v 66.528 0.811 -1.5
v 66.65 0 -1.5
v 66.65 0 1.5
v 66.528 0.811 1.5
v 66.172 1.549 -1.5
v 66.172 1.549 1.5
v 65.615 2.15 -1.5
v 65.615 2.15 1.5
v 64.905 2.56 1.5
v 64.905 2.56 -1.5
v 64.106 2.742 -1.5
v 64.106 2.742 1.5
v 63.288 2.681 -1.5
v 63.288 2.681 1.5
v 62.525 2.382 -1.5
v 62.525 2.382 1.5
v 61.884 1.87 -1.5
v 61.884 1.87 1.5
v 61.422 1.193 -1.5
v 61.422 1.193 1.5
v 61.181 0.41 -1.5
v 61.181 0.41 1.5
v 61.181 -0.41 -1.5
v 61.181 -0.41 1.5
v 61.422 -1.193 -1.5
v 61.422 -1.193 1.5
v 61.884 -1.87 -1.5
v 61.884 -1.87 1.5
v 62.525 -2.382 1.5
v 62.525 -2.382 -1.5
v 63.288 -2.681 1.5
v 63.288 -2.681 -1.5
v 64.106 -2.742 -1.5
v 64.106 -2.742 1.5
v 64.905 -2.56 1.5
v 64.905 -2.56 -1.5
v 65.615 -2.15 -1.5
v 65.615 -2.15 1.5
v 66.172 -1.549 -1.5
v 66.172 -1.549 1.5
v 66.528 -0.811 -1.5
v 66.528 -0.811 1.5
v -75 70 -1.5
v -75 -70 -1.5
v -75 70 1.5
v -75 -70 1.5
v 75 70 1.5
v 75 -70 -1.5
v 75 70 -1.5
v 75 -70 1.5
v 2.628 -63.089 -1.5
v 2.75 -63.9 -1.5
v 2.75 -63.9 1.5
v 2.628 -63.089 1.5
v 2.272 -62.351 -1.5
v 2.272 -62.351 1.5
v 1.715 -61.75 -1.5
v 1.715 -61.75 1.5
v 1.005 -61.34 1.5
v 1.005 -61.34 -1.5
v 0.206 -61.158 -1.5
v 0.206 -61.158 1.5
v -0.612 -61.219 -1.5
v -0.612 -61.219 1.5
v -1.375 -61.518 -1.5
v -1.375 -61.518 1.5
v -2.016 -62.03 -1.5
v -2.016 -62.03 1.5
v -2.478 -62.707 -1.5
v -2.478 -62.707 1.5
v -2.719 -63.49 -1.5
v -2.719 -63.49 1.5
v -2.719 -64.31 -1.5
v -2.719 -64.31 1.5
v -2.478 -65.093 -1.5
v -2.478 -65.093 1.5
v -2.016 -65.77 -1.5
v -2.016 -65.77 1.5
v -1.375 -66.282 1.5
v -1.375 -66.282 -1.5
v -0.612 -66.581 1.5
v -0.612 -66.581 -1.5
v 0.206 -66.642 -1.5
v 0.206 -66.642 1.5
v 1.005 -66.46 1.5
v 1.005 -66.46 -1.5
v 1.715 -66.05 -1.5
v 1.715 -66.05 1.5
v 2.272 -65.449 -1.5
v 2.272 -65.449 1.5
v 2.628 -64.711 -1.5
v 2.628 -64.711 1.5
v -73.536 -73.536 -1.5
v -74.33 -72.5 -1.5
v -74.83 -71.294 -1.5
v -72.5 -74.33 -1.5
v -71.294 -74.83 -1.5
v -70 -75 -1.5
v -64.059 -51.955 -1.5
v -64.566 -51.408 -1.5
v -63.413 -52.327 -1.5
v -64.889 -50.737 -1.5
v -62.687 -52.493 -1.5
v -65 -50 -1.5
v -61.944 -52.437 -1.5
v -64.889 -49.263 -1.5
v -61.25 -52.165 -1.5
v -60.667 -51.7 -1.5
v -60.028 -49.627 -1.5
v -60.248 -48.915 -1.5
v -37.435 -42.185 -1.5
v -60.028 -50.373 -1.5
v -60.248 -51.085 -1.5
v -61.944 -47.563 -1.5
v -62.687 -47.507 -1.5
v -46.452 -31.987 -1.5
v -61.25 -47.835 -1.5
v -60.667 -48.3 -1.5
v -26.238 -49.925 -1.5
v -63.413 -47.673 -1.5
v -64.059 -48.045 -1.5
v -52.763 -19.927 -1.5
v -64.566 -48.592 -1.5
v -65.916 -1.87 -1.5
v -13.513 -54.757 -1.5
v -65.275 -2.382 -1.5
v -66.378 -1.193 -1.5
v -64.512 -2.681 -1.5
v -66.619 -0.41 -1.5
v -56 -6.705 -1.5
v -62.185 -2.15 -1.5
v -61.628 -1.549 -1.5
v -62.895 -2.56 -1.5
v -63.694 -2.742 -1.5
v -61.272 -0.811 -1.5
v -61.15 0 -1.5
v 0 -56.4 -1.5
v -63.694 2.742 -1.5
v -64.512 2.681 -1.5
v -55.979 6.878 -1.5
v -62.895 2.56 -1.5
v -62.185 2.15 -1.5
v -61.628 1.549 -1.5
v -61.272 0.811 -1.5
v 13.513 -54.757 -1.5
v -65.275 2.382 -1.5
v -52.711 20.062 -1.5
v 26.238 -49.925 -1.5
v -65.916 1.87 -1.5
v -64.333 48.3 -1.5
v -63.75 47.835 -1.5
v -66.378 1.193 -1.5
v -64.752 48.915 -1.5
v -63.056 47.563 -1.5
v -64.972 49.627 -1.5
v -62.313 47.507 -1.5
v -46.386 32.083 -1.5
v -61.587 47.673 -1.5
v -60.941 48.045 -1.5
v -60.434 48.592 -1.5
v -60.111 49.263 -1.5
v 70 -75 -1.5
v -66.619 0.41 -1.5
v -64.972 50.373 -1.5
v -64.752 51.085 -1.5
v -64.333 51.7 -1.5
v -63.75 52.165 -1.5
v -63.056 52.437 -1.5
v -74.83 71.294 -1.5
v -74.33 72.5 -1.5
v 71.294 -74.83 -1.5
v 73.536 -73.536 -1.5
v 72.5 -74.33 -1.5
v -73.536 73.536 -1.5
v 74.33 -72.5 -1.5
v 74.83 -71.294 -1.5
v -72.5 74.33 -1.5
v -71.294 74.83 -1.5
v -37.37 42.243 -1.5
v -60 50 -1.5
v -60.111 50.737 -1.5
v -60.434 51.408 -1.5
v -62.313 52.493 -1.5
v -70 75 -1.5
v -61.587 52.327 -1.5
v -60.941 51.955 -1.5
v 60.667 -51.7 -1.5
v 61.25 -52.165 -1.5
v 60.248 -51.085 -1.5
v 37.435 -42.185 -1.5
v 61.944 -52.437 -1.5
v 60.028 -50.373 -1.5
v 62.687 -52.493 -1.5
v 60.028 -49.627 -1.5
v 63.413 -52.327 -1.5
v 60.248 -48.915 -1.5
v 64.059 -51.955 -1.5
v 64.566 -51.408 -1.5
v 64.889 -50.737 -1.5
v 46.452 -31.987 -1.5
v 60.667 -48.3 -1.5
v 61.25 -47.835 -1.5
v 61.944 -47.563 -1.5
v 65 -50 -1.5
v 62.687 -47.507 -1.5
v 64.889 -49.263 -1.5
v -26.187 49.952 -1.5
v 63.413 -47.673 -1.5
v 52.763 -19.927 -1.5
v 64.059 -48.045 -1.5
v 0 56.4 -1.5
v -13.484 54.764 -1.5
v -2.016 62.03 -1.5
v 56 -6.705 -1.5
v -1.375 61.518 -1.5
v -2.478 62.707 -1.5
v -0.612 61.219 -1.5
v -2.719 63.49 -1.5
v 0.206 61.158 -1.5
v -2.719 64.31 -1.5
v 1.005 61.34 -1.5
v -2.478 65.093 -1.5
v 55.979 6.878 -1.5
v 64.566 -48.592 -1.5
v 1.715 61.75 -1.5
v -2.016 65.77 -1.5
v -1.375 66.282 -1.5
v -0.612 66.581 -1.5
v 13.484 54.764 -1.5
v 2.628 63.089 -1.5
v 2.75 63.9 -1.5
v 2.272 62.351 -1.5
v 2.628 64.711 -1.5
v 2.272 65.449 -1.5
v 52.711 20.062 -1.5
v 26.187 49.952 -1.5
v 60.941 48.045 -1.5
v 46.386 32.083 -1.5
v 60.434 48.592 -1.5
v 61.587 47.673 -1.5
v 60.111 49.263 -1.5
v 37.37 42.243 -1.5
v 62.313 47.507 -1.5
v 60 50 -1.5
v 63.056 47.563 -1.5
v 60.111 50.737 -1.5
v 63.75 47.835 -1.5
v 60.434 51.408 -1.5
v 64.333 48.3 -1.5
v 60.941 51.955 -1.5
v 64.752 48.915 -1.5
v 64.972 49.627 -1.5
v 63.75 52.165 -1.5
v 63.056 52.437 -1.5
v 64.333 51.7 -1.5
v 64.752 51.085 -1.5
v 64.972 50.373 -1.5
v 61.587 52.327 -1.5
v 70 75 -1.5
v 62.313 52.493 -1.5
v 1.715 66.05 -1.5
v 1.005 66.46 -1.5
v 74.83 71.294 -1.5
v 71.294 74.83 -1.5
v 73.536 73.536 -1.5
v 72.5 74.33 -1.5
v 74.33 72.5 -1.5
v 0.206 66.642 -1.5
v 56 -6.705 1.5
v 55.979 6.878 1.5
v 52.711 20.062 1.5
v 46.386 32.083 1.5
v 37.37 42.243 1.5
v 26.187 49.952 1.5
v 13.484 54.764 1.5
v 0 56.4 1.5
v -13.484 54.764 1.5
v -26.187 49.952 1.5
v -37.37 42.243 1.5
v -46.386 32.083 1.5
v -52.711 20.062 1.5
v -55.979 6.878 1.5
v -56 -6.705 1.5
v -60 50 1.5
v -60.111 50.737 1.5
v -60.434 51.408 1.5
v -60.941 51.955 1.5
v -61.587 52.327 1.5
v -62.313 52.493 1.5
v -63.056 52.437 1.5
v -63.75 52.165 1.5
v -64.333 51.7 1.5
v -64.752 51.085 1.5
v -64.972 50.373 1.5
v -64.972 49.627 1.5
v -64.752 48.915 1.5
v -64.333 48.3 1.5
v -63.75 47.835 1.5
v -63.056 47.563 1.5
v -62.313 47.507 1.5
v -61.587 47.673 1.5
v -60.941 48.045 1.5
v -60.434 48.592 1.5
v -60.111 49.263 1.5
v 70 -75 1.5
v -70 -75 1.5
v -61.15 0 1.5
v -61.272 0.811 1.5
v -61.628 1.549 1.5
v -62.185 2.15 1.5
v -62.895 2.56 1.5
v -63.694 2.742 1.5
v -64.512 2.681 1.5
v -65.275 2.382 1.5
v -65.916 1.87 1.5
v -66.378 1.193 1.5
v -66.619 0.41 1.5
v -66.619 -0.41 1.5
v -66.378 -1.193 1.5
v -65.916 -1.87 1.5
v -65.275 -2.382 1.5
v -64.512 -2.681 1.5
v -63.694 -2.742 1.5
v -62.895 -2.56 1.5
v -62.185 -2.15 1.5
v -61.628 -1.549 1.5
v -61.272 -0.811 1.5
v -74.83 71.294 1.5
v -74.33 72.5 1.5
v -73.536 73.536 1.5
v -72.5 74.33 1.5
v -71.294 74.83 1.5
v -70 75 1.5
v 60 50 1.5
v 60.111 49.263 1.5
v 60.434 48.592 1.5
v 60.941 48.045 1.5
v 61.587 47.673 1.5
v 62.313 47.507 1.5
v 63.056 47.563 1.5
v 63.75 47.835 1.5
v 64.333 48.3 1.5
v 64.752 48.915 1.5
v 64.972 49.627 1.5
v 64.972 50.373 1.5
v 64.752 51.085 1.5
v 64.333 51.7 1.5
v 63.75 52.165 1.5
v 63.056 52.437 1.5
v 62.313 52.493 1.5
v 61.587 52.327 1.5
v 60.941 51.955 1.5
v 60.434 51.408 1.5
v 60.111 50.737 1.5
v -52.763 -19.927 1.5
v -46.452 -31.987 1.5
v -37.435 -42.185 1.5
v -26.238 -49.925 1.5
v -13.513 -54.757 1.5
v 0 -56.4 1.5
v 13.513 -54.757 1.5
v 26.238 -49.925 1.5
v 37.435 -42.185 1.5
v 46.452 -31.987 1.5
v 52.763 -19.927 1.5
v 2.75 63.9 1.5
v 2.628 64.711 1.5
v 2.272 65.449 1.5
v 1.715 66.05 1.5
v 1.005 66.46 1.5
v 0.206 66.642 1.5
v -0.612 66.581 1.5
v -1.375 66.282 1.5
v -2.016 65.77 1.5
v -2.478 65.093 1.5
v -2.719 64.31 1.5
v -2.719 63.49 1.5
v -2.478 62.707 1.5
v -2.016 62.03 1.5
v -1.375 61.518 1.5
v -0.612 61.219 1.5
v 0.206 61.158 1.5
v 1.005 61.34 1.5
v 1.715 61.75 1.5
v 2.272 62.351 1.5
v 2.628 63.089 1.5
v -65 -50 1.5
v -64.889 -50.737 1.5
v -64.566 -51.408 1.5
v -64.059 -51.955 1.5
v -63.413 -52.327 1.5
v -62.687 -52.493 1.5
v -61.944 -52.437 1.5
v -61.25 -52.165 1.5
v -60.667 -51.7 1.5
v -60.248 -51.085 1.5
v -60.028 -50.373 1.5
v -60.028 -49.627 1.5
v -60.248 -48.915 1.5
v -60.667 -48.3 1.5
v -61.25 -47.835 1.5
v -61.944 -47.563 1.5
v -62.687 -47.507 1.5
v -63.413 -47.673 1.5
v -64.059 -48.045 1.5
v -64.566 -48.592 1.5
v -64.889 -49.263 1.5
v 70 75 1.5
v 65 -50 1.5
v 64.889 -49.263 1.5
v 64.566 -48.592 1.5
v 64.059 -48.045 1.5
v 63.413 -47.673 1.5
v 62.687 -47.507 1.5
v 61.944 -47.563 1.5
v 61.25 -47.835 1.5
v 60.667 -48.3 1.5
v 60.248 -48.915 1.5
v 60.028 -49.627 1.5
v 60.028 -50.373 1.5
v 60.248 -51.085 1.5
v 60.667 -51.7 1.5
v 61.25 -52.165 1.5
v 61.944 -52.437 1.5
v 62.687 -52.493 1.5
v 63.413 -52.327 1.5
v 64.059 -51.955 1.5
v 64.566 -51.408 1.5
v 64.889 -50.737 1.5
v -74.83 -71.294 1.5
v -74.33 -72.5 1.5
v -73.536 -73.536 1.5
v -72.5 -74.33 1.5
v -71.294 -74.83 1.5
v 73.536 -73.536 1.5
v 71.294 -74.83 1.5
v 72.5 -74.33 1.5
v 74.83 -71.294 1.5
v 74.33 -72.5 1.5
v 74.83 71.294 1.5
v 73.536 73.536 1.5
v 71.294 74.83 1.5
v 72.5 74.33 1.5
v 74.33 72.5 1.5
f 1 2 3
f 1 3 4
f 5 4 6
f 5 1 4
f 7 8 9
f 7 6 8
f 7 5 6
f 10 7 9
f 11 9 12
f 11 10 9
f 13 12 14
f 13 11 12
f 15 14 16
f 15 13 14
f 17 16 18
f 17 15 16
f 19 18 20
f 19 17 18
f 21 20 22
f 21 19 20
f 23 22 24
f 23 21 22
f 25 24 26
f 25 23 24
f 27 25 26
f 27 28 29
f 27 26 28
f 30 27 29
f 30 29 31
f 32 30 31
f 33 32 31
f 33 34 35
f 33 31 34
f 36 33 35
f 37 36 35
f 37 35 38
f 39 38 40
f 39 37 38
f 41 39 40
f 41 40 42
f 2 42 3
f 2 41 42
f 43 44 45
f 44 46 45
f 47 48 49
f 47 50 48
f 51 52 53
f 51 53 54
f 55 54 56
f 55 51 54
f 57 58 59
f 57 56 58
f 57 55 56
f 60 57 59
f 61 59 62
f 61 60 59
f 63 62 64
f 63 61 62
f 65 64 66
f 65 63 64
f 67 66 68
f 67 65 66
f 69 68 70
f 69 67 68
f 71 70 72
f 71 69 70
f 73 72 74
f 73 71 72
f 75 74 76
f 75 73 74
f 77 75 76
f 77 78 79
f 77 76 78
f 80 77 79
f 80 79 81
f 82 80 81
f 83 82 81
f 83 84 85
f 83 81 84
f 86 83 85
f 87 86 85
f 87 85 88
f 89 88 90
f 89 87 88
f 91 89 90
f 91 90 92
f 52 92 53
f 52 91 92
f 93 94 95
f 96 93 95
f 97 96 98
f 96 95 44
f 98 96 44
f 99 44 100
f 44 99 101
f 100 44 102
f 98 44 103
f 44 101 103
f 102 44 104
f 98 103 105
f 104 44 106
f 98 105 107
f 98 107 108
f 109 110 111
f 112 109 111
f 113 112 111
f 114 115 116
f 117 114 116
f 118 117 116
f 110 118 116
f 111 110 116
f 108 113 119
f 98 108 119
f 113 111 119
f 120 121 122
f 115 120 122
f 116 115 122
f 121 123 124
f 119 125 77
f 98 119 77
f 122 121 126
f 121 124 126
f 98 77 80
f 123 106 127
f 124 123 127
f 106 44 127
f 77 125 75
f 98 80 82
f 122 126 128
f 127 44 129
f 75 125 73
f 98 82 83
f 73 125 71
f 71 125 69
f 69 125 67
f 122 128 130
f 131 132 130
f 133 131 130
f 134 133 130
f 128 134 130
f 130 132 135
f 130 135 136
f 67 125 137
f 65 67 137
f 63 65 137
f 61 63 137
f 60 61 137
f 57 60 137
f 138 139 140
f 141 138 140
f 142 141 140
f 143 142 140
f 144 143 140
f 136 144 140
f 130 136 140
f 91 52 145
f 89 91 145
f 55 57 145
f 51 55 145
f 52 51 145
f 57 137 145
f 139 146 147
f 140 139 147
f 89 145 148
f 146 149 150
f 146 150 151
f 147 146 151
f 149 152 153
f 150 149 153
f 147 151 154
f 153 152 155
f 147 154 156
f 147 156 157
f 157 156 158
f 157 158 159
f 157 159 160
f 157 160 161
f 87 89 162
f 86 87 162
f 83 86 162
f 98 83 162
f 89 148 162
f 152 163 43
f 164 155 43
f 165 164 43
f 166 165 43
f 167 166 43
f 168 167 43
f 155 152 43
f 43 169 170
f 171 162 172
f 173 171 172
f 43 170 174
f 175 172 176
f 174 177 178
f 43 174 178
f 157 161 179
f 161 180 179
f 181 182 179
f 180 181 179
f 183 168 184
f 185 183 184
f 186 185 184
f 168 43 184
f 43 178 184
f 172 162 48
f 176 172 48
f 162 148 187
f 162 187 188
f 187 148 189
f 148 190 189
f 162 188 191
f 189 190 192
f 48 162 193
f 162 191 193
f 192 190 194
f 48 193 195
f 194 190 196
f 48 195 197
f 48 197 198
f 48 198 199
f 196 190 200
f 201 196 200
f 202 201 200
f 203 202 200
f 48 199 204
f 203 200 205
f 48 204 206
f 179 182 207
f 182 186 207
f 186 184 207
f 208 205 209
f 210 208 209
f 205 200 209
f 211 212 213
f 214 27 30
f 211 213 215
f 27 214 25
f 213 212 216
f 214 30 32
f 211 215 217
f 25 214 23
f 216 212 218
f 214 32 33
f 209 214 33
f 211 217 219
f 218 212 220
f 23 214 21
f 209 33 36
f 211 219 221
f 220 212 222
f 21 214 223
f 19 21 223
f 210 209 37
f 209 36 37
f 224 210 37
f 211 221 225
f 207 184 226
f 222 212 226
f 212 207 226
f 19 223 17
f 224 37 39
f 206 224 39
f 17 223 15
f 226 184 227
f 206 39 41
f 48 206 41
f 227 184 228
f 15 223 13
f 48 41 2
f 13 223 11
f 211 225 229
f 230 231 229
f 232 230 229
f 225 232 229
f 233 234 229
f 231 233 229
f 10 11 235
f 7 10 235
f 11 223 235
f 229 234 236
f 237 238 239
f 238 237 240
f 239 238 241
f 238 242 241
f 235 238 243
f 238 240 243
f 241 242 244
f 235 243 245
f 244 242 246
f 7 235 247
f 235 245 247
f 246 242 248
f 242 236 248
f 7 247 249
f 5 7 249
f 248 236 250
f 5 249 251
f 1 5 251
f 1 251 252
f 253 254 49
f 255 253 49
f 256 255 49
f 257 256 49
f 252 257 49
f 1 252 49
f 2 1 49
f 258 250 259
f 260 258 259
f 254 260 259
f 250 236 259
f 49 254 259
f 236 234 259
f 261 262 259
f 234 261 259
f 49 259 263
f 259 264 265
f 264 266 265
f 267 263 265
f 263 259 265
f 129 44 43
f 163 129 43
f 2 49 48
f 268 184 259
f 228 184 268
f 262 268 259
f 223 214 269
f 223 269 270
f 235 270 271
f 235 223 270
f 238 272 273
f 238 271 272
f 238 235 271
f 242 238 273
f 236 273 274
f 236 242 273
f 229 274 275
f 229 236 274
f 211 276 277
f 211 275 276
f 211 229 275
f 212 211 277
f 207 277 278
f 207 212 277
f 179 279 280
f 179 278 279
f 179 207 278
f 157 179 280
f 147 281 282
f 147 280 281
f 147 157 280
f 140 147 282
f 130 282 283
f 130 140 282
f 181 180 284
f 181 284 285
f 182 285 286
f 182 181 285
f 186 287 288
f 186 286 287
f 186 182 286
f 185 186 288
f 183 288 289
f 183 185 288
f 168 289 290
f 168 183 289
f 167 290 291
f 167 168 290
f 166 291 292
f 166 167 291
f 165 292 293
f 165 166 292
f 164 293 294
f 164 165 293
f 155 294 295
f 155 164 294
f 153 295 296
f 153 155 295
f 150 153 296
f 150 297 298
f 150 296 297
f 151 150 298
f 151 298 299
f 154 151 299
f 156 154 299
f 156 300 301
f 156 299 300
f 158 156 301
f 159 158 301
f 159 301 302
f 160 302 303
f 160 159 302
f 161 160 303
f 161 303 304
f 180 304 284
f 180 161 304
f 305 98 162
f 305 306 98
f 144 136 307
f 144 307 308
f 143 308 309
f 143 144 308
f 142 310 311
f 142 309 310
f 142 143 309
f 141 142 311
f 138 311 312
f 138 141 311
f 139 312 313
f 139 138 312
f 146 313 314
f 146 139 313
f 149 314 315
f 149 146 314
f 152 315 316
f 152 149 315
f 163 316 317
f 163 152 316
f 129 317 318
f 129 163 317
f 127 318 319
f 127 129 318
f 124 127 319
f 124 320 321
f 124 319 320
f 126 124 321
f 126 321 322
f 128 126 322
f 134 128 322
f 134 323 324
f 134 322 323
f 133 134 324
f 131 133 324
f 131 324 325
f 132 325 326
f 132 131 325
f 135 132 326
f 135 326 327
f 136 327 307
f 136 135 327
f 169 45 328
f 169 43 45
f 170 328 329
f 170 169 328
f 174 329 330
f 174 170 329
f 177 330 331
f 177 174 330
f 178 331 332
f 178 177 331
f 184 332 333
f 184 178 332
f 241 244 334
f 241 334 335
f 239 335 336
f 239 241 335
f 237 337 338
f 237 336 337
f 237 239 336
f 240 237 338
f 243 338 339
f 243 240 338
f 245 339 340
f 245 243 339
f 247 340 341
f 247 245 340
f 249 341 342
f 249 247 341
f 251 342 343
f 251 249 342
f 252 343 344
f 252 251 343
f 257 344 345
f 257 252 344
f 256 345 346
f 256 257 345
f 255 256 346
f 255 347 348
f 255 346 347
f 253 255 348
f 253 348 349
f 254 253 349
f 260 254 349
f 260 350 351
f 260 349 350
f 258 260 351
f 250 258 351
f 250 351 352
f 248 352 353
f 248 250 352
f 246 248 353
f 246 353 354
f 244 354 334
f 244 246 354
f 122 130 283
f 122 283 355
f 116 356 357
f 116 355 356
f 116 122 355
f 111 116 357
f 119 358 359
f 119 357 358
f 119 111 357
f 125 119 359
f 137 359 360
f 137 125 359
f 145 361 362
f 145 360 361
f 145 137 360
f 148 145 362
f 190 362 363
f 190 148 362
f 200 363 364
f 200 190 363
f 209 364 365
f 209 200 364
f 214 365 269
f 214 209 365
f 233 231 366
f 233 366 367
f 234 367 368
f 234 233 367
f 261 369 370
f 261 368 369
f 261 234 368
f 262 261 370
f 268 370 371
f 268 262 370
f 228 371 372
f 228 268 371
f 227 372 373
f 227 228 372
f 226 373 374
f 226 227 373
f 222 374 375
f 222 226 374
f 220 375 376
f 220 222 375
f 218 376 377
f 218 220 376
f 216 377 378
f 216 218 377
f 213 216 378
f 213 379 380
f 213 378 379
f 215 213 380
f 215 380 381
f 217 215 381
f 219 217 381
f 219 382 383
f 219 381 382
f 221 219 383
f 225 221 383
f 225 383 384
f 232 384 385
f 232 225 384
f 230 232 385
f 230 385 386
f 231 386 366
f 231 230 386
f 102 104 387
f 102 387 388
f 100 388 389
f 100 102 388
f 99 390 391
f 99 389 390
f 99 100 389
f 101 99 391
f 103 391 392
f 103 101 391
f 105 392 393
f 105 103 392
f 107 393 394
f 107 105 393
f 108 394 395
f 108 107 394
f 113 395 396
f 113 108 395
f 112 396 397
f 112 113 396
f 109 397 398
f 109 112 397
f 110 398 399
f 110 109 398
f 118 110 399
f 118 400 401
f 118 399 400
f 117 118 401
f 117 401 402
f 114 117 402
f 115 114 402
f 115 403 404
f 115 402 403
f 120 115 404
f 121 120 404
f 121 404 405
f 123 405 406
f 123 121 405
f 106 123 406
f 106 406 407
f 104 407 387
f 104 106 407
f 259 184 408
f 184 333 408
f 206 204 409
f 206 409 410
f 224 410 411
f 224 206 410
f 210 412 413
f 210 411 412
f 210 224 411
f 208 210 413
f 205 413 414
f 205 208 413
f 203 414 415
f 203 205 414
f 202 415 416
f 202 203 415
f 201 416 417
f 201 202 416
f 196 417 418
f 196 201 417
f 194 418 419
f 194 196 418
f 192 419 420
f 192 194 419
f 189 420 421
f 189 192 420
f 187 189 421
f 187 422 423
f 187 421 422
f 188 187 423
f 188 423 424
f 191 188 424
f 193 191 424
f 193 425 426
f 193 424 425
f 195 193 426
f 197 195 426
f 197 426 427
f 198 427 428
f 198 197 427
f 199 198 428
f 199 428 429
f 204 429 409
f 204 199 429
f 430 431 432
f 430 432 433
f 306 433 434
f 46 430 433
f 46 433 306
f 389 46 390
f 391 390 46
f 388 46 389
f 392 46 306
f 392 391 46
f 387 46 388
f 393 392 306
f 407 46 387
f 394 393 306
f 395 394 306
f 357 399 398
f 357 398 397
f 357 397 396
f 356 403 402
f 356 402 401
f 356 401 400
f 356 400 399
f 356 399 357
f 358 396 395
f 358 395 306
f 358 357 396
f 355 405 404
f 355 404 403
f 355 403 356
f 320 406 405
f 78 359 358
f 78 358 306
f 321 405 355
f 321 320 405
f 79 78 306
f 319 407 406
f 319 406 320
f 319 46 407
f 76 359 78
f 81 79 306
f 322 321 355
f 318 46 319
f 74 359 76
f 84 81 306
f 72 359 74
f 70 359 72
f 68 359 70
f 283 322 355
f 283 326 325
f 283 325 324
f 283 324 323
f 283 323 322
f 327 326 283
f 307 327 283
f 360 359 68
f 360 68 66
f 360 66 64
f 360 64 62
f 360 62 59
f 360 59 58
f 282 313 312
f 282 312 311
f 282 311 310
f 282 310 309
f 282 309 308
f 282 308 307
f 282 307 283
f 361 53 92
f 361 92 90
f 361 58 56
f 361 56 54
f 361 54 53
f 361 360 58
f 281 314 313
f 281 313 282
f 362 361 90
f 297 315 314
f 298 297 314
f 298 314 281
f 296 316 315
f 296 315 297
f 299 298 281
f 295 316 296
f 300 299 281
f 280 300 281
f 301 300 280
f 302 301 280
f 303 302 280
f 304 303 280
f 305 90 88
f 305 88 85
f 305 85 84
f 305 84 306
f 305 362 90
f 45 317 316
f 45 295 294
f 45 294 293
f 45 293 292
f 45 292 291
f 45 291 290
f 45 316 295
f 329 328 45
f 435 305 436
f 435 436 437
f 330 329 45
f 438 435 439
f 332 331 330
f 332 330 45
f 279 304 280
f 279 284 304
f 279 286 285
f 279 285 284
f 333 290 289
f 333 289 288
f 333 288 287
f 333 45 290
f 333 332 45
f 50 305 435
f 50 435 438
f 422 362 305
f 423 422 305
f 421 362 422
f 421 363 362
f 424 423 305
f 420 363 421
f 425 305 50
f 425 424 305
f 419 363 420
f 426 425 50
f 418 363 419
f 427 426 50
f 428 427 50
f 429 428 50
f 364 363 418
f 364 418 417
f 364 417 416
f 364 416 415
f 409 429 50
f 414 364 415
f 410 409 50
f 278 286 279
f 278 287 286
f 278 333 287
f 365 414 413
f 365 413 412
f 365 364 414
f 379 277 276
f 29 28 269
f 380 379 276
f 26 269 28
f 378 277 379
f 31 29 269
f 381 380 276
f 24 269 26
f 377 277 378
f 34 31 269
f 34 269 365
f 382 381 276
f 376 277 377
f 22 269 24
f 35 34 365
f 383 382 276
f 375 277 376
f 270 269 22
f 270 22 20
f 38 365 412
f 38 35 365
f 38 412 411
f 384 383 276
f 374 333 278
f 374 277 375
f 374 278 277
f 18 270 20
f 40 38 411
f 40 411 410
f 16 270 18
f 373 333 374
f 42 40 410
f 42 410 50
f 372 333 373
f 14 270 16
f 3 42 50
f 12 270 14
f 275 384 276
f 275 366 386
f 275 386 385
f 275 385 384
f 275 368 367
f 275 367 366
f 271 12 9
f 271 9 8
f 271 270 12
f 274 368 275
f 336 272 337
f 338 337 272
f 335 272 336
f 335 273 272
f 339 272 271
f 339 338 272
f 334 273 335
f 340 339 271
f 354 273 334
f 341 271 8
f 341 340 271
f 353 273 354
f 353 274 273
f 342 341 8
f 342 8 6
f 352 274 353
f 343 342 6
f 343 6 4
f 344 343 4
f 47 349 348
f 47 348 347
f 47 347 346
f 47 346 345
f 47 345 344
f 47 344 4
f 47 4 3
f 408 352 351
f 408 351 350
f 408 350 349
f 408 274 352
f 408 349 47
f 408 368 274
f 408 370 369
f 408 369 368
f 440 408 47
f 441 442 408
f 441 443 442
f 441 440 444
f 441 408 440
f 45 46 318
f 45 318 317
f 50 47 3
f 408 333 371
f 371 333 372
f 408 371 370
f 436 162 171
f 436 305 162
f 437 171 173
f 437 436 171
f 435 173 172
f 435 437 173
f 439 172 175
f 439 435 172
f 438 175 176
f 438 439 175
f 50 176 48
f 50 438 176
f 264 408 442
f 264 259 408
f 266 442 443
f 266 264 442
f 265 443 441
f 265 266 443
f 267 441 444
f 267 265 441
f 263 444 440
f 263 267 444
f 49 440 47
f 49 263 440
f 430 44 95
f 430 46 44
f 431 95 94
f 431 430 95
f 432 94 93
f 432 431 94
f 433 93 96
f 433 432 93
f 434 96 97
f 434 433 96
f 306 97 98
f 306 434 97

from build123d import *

# Parameters (mm, degrees)
SKETCH1_W               = 150
SKETCH1_H               = 150
BOSS_EXTRUDE1_DEPTH     = 1.5
CUT_EXTRUDE1_DEPTH      = 107.076623249
CUT_EXTRUDE1_DEPTH_BACK = 107.076623249
SKETCH2_R               = 2.75
CUT_EXTRUDE2_DEPTH      = 107.076623249
CUT_EXTRUDE2_DEPTH_BACK = 107.076623249
CUT_EXTRUDE3_DEPTH      = 107.076623249
CUT_EXTRUDE3_DEPTH_BACK = 107.076623249
SKETCH4_R               = 2.5
FILLET1_R               = 5


with BuildPart() as part:
    # Sketch1 → Boss-Extrude1 (new, symmetric)
    with BuildSketch(Plane.XY):
        Rectangle(SKETCH1_W, SKETCH1_H)
    extrude(amount=BOSS_EXTRUDE1_DEPTH, both=True)

    # Sketch2 → Cut-Extrude1 (cut, two sides: drawn at the far end of the back side and taken through both)
    with BuildSketch(Plane.XY.offset(-CUT_EXTRUDE1_DEPTH_BACK)):
        with Locations((0, 63.9)):
            Circle(SKETCH2_R)
        with Locations((63.9, 0)):
            Circle(SKETCH2_R)
        with Locations((0, -63.9)):
            Circle(SKETCH2_R)
        with Locations((-63.9, 0)):
            Circle(SKETCH2_R)
    extrude(amount=CUT_EXTRUDE1_DEPTH + CUT_EXTRUDE1_DEPTH_BACK, mode=Mode.SUBTRACT)

    # Sketch3 → Cut-Extrude2 (cut, two sides: drawn at the far end of the back side and taken through both)
    with BuildSketch(Plane.XY.offset(-CUT_EXTRUDE2_DEPTH_BACK)):
        with BuildLine():
            ThreePointArc((-56, -6.705221846), (0, -56.4), (56, -6.705221846))
            ThreePointArc((56, -6.705221846), (0, 56.4), (-56, -6.705221846))
        make_face()
    extrude(amount=CUT_EXTRUDE2_DEPTH + CUT_EXTRUDE2_DEPTH_BACK, mode=Mode.SUBTRACT)

    # Sketch4 → Cut-Extrude3 (cut, two sides: drawn at the far end of the back side and taken through both)
    with BuildSketch(Plane.XY.offset(-CUT_EXTRUDE3_DEPTH_BACK)):
        with Locations((-62.5, 50)):
            Circle(SKETCH4_R)
        with Locations(Location((-62.5, -50, 0), (0, 0, 180))):
            Circle(SKETCH4_R)
        with Locations((62.5, -50)):
            Circle(SKETCH4_R)
        with Locations(Location((62.5, 50, 0), (0, 0, 180))):
            Circle(SKETCH4_R)
    extrude(amount=CUT_EXTRUDE3_DEPTH + CUT_EXTRUDE3_DEPTH_BACK, mode=Mode.SUBTRACT)

    # Fillet1
    fillet1_edges = [part.edges().sort_by_distance(p)[0] for p in [
        (75, -75, 0),
        (-75, -75, 0),
        (-75, 75, 0),
        (75, 75, 0),
    ]]
    fillet(fillet1_edges, radius=FILLET1_R)


solid = part.part
